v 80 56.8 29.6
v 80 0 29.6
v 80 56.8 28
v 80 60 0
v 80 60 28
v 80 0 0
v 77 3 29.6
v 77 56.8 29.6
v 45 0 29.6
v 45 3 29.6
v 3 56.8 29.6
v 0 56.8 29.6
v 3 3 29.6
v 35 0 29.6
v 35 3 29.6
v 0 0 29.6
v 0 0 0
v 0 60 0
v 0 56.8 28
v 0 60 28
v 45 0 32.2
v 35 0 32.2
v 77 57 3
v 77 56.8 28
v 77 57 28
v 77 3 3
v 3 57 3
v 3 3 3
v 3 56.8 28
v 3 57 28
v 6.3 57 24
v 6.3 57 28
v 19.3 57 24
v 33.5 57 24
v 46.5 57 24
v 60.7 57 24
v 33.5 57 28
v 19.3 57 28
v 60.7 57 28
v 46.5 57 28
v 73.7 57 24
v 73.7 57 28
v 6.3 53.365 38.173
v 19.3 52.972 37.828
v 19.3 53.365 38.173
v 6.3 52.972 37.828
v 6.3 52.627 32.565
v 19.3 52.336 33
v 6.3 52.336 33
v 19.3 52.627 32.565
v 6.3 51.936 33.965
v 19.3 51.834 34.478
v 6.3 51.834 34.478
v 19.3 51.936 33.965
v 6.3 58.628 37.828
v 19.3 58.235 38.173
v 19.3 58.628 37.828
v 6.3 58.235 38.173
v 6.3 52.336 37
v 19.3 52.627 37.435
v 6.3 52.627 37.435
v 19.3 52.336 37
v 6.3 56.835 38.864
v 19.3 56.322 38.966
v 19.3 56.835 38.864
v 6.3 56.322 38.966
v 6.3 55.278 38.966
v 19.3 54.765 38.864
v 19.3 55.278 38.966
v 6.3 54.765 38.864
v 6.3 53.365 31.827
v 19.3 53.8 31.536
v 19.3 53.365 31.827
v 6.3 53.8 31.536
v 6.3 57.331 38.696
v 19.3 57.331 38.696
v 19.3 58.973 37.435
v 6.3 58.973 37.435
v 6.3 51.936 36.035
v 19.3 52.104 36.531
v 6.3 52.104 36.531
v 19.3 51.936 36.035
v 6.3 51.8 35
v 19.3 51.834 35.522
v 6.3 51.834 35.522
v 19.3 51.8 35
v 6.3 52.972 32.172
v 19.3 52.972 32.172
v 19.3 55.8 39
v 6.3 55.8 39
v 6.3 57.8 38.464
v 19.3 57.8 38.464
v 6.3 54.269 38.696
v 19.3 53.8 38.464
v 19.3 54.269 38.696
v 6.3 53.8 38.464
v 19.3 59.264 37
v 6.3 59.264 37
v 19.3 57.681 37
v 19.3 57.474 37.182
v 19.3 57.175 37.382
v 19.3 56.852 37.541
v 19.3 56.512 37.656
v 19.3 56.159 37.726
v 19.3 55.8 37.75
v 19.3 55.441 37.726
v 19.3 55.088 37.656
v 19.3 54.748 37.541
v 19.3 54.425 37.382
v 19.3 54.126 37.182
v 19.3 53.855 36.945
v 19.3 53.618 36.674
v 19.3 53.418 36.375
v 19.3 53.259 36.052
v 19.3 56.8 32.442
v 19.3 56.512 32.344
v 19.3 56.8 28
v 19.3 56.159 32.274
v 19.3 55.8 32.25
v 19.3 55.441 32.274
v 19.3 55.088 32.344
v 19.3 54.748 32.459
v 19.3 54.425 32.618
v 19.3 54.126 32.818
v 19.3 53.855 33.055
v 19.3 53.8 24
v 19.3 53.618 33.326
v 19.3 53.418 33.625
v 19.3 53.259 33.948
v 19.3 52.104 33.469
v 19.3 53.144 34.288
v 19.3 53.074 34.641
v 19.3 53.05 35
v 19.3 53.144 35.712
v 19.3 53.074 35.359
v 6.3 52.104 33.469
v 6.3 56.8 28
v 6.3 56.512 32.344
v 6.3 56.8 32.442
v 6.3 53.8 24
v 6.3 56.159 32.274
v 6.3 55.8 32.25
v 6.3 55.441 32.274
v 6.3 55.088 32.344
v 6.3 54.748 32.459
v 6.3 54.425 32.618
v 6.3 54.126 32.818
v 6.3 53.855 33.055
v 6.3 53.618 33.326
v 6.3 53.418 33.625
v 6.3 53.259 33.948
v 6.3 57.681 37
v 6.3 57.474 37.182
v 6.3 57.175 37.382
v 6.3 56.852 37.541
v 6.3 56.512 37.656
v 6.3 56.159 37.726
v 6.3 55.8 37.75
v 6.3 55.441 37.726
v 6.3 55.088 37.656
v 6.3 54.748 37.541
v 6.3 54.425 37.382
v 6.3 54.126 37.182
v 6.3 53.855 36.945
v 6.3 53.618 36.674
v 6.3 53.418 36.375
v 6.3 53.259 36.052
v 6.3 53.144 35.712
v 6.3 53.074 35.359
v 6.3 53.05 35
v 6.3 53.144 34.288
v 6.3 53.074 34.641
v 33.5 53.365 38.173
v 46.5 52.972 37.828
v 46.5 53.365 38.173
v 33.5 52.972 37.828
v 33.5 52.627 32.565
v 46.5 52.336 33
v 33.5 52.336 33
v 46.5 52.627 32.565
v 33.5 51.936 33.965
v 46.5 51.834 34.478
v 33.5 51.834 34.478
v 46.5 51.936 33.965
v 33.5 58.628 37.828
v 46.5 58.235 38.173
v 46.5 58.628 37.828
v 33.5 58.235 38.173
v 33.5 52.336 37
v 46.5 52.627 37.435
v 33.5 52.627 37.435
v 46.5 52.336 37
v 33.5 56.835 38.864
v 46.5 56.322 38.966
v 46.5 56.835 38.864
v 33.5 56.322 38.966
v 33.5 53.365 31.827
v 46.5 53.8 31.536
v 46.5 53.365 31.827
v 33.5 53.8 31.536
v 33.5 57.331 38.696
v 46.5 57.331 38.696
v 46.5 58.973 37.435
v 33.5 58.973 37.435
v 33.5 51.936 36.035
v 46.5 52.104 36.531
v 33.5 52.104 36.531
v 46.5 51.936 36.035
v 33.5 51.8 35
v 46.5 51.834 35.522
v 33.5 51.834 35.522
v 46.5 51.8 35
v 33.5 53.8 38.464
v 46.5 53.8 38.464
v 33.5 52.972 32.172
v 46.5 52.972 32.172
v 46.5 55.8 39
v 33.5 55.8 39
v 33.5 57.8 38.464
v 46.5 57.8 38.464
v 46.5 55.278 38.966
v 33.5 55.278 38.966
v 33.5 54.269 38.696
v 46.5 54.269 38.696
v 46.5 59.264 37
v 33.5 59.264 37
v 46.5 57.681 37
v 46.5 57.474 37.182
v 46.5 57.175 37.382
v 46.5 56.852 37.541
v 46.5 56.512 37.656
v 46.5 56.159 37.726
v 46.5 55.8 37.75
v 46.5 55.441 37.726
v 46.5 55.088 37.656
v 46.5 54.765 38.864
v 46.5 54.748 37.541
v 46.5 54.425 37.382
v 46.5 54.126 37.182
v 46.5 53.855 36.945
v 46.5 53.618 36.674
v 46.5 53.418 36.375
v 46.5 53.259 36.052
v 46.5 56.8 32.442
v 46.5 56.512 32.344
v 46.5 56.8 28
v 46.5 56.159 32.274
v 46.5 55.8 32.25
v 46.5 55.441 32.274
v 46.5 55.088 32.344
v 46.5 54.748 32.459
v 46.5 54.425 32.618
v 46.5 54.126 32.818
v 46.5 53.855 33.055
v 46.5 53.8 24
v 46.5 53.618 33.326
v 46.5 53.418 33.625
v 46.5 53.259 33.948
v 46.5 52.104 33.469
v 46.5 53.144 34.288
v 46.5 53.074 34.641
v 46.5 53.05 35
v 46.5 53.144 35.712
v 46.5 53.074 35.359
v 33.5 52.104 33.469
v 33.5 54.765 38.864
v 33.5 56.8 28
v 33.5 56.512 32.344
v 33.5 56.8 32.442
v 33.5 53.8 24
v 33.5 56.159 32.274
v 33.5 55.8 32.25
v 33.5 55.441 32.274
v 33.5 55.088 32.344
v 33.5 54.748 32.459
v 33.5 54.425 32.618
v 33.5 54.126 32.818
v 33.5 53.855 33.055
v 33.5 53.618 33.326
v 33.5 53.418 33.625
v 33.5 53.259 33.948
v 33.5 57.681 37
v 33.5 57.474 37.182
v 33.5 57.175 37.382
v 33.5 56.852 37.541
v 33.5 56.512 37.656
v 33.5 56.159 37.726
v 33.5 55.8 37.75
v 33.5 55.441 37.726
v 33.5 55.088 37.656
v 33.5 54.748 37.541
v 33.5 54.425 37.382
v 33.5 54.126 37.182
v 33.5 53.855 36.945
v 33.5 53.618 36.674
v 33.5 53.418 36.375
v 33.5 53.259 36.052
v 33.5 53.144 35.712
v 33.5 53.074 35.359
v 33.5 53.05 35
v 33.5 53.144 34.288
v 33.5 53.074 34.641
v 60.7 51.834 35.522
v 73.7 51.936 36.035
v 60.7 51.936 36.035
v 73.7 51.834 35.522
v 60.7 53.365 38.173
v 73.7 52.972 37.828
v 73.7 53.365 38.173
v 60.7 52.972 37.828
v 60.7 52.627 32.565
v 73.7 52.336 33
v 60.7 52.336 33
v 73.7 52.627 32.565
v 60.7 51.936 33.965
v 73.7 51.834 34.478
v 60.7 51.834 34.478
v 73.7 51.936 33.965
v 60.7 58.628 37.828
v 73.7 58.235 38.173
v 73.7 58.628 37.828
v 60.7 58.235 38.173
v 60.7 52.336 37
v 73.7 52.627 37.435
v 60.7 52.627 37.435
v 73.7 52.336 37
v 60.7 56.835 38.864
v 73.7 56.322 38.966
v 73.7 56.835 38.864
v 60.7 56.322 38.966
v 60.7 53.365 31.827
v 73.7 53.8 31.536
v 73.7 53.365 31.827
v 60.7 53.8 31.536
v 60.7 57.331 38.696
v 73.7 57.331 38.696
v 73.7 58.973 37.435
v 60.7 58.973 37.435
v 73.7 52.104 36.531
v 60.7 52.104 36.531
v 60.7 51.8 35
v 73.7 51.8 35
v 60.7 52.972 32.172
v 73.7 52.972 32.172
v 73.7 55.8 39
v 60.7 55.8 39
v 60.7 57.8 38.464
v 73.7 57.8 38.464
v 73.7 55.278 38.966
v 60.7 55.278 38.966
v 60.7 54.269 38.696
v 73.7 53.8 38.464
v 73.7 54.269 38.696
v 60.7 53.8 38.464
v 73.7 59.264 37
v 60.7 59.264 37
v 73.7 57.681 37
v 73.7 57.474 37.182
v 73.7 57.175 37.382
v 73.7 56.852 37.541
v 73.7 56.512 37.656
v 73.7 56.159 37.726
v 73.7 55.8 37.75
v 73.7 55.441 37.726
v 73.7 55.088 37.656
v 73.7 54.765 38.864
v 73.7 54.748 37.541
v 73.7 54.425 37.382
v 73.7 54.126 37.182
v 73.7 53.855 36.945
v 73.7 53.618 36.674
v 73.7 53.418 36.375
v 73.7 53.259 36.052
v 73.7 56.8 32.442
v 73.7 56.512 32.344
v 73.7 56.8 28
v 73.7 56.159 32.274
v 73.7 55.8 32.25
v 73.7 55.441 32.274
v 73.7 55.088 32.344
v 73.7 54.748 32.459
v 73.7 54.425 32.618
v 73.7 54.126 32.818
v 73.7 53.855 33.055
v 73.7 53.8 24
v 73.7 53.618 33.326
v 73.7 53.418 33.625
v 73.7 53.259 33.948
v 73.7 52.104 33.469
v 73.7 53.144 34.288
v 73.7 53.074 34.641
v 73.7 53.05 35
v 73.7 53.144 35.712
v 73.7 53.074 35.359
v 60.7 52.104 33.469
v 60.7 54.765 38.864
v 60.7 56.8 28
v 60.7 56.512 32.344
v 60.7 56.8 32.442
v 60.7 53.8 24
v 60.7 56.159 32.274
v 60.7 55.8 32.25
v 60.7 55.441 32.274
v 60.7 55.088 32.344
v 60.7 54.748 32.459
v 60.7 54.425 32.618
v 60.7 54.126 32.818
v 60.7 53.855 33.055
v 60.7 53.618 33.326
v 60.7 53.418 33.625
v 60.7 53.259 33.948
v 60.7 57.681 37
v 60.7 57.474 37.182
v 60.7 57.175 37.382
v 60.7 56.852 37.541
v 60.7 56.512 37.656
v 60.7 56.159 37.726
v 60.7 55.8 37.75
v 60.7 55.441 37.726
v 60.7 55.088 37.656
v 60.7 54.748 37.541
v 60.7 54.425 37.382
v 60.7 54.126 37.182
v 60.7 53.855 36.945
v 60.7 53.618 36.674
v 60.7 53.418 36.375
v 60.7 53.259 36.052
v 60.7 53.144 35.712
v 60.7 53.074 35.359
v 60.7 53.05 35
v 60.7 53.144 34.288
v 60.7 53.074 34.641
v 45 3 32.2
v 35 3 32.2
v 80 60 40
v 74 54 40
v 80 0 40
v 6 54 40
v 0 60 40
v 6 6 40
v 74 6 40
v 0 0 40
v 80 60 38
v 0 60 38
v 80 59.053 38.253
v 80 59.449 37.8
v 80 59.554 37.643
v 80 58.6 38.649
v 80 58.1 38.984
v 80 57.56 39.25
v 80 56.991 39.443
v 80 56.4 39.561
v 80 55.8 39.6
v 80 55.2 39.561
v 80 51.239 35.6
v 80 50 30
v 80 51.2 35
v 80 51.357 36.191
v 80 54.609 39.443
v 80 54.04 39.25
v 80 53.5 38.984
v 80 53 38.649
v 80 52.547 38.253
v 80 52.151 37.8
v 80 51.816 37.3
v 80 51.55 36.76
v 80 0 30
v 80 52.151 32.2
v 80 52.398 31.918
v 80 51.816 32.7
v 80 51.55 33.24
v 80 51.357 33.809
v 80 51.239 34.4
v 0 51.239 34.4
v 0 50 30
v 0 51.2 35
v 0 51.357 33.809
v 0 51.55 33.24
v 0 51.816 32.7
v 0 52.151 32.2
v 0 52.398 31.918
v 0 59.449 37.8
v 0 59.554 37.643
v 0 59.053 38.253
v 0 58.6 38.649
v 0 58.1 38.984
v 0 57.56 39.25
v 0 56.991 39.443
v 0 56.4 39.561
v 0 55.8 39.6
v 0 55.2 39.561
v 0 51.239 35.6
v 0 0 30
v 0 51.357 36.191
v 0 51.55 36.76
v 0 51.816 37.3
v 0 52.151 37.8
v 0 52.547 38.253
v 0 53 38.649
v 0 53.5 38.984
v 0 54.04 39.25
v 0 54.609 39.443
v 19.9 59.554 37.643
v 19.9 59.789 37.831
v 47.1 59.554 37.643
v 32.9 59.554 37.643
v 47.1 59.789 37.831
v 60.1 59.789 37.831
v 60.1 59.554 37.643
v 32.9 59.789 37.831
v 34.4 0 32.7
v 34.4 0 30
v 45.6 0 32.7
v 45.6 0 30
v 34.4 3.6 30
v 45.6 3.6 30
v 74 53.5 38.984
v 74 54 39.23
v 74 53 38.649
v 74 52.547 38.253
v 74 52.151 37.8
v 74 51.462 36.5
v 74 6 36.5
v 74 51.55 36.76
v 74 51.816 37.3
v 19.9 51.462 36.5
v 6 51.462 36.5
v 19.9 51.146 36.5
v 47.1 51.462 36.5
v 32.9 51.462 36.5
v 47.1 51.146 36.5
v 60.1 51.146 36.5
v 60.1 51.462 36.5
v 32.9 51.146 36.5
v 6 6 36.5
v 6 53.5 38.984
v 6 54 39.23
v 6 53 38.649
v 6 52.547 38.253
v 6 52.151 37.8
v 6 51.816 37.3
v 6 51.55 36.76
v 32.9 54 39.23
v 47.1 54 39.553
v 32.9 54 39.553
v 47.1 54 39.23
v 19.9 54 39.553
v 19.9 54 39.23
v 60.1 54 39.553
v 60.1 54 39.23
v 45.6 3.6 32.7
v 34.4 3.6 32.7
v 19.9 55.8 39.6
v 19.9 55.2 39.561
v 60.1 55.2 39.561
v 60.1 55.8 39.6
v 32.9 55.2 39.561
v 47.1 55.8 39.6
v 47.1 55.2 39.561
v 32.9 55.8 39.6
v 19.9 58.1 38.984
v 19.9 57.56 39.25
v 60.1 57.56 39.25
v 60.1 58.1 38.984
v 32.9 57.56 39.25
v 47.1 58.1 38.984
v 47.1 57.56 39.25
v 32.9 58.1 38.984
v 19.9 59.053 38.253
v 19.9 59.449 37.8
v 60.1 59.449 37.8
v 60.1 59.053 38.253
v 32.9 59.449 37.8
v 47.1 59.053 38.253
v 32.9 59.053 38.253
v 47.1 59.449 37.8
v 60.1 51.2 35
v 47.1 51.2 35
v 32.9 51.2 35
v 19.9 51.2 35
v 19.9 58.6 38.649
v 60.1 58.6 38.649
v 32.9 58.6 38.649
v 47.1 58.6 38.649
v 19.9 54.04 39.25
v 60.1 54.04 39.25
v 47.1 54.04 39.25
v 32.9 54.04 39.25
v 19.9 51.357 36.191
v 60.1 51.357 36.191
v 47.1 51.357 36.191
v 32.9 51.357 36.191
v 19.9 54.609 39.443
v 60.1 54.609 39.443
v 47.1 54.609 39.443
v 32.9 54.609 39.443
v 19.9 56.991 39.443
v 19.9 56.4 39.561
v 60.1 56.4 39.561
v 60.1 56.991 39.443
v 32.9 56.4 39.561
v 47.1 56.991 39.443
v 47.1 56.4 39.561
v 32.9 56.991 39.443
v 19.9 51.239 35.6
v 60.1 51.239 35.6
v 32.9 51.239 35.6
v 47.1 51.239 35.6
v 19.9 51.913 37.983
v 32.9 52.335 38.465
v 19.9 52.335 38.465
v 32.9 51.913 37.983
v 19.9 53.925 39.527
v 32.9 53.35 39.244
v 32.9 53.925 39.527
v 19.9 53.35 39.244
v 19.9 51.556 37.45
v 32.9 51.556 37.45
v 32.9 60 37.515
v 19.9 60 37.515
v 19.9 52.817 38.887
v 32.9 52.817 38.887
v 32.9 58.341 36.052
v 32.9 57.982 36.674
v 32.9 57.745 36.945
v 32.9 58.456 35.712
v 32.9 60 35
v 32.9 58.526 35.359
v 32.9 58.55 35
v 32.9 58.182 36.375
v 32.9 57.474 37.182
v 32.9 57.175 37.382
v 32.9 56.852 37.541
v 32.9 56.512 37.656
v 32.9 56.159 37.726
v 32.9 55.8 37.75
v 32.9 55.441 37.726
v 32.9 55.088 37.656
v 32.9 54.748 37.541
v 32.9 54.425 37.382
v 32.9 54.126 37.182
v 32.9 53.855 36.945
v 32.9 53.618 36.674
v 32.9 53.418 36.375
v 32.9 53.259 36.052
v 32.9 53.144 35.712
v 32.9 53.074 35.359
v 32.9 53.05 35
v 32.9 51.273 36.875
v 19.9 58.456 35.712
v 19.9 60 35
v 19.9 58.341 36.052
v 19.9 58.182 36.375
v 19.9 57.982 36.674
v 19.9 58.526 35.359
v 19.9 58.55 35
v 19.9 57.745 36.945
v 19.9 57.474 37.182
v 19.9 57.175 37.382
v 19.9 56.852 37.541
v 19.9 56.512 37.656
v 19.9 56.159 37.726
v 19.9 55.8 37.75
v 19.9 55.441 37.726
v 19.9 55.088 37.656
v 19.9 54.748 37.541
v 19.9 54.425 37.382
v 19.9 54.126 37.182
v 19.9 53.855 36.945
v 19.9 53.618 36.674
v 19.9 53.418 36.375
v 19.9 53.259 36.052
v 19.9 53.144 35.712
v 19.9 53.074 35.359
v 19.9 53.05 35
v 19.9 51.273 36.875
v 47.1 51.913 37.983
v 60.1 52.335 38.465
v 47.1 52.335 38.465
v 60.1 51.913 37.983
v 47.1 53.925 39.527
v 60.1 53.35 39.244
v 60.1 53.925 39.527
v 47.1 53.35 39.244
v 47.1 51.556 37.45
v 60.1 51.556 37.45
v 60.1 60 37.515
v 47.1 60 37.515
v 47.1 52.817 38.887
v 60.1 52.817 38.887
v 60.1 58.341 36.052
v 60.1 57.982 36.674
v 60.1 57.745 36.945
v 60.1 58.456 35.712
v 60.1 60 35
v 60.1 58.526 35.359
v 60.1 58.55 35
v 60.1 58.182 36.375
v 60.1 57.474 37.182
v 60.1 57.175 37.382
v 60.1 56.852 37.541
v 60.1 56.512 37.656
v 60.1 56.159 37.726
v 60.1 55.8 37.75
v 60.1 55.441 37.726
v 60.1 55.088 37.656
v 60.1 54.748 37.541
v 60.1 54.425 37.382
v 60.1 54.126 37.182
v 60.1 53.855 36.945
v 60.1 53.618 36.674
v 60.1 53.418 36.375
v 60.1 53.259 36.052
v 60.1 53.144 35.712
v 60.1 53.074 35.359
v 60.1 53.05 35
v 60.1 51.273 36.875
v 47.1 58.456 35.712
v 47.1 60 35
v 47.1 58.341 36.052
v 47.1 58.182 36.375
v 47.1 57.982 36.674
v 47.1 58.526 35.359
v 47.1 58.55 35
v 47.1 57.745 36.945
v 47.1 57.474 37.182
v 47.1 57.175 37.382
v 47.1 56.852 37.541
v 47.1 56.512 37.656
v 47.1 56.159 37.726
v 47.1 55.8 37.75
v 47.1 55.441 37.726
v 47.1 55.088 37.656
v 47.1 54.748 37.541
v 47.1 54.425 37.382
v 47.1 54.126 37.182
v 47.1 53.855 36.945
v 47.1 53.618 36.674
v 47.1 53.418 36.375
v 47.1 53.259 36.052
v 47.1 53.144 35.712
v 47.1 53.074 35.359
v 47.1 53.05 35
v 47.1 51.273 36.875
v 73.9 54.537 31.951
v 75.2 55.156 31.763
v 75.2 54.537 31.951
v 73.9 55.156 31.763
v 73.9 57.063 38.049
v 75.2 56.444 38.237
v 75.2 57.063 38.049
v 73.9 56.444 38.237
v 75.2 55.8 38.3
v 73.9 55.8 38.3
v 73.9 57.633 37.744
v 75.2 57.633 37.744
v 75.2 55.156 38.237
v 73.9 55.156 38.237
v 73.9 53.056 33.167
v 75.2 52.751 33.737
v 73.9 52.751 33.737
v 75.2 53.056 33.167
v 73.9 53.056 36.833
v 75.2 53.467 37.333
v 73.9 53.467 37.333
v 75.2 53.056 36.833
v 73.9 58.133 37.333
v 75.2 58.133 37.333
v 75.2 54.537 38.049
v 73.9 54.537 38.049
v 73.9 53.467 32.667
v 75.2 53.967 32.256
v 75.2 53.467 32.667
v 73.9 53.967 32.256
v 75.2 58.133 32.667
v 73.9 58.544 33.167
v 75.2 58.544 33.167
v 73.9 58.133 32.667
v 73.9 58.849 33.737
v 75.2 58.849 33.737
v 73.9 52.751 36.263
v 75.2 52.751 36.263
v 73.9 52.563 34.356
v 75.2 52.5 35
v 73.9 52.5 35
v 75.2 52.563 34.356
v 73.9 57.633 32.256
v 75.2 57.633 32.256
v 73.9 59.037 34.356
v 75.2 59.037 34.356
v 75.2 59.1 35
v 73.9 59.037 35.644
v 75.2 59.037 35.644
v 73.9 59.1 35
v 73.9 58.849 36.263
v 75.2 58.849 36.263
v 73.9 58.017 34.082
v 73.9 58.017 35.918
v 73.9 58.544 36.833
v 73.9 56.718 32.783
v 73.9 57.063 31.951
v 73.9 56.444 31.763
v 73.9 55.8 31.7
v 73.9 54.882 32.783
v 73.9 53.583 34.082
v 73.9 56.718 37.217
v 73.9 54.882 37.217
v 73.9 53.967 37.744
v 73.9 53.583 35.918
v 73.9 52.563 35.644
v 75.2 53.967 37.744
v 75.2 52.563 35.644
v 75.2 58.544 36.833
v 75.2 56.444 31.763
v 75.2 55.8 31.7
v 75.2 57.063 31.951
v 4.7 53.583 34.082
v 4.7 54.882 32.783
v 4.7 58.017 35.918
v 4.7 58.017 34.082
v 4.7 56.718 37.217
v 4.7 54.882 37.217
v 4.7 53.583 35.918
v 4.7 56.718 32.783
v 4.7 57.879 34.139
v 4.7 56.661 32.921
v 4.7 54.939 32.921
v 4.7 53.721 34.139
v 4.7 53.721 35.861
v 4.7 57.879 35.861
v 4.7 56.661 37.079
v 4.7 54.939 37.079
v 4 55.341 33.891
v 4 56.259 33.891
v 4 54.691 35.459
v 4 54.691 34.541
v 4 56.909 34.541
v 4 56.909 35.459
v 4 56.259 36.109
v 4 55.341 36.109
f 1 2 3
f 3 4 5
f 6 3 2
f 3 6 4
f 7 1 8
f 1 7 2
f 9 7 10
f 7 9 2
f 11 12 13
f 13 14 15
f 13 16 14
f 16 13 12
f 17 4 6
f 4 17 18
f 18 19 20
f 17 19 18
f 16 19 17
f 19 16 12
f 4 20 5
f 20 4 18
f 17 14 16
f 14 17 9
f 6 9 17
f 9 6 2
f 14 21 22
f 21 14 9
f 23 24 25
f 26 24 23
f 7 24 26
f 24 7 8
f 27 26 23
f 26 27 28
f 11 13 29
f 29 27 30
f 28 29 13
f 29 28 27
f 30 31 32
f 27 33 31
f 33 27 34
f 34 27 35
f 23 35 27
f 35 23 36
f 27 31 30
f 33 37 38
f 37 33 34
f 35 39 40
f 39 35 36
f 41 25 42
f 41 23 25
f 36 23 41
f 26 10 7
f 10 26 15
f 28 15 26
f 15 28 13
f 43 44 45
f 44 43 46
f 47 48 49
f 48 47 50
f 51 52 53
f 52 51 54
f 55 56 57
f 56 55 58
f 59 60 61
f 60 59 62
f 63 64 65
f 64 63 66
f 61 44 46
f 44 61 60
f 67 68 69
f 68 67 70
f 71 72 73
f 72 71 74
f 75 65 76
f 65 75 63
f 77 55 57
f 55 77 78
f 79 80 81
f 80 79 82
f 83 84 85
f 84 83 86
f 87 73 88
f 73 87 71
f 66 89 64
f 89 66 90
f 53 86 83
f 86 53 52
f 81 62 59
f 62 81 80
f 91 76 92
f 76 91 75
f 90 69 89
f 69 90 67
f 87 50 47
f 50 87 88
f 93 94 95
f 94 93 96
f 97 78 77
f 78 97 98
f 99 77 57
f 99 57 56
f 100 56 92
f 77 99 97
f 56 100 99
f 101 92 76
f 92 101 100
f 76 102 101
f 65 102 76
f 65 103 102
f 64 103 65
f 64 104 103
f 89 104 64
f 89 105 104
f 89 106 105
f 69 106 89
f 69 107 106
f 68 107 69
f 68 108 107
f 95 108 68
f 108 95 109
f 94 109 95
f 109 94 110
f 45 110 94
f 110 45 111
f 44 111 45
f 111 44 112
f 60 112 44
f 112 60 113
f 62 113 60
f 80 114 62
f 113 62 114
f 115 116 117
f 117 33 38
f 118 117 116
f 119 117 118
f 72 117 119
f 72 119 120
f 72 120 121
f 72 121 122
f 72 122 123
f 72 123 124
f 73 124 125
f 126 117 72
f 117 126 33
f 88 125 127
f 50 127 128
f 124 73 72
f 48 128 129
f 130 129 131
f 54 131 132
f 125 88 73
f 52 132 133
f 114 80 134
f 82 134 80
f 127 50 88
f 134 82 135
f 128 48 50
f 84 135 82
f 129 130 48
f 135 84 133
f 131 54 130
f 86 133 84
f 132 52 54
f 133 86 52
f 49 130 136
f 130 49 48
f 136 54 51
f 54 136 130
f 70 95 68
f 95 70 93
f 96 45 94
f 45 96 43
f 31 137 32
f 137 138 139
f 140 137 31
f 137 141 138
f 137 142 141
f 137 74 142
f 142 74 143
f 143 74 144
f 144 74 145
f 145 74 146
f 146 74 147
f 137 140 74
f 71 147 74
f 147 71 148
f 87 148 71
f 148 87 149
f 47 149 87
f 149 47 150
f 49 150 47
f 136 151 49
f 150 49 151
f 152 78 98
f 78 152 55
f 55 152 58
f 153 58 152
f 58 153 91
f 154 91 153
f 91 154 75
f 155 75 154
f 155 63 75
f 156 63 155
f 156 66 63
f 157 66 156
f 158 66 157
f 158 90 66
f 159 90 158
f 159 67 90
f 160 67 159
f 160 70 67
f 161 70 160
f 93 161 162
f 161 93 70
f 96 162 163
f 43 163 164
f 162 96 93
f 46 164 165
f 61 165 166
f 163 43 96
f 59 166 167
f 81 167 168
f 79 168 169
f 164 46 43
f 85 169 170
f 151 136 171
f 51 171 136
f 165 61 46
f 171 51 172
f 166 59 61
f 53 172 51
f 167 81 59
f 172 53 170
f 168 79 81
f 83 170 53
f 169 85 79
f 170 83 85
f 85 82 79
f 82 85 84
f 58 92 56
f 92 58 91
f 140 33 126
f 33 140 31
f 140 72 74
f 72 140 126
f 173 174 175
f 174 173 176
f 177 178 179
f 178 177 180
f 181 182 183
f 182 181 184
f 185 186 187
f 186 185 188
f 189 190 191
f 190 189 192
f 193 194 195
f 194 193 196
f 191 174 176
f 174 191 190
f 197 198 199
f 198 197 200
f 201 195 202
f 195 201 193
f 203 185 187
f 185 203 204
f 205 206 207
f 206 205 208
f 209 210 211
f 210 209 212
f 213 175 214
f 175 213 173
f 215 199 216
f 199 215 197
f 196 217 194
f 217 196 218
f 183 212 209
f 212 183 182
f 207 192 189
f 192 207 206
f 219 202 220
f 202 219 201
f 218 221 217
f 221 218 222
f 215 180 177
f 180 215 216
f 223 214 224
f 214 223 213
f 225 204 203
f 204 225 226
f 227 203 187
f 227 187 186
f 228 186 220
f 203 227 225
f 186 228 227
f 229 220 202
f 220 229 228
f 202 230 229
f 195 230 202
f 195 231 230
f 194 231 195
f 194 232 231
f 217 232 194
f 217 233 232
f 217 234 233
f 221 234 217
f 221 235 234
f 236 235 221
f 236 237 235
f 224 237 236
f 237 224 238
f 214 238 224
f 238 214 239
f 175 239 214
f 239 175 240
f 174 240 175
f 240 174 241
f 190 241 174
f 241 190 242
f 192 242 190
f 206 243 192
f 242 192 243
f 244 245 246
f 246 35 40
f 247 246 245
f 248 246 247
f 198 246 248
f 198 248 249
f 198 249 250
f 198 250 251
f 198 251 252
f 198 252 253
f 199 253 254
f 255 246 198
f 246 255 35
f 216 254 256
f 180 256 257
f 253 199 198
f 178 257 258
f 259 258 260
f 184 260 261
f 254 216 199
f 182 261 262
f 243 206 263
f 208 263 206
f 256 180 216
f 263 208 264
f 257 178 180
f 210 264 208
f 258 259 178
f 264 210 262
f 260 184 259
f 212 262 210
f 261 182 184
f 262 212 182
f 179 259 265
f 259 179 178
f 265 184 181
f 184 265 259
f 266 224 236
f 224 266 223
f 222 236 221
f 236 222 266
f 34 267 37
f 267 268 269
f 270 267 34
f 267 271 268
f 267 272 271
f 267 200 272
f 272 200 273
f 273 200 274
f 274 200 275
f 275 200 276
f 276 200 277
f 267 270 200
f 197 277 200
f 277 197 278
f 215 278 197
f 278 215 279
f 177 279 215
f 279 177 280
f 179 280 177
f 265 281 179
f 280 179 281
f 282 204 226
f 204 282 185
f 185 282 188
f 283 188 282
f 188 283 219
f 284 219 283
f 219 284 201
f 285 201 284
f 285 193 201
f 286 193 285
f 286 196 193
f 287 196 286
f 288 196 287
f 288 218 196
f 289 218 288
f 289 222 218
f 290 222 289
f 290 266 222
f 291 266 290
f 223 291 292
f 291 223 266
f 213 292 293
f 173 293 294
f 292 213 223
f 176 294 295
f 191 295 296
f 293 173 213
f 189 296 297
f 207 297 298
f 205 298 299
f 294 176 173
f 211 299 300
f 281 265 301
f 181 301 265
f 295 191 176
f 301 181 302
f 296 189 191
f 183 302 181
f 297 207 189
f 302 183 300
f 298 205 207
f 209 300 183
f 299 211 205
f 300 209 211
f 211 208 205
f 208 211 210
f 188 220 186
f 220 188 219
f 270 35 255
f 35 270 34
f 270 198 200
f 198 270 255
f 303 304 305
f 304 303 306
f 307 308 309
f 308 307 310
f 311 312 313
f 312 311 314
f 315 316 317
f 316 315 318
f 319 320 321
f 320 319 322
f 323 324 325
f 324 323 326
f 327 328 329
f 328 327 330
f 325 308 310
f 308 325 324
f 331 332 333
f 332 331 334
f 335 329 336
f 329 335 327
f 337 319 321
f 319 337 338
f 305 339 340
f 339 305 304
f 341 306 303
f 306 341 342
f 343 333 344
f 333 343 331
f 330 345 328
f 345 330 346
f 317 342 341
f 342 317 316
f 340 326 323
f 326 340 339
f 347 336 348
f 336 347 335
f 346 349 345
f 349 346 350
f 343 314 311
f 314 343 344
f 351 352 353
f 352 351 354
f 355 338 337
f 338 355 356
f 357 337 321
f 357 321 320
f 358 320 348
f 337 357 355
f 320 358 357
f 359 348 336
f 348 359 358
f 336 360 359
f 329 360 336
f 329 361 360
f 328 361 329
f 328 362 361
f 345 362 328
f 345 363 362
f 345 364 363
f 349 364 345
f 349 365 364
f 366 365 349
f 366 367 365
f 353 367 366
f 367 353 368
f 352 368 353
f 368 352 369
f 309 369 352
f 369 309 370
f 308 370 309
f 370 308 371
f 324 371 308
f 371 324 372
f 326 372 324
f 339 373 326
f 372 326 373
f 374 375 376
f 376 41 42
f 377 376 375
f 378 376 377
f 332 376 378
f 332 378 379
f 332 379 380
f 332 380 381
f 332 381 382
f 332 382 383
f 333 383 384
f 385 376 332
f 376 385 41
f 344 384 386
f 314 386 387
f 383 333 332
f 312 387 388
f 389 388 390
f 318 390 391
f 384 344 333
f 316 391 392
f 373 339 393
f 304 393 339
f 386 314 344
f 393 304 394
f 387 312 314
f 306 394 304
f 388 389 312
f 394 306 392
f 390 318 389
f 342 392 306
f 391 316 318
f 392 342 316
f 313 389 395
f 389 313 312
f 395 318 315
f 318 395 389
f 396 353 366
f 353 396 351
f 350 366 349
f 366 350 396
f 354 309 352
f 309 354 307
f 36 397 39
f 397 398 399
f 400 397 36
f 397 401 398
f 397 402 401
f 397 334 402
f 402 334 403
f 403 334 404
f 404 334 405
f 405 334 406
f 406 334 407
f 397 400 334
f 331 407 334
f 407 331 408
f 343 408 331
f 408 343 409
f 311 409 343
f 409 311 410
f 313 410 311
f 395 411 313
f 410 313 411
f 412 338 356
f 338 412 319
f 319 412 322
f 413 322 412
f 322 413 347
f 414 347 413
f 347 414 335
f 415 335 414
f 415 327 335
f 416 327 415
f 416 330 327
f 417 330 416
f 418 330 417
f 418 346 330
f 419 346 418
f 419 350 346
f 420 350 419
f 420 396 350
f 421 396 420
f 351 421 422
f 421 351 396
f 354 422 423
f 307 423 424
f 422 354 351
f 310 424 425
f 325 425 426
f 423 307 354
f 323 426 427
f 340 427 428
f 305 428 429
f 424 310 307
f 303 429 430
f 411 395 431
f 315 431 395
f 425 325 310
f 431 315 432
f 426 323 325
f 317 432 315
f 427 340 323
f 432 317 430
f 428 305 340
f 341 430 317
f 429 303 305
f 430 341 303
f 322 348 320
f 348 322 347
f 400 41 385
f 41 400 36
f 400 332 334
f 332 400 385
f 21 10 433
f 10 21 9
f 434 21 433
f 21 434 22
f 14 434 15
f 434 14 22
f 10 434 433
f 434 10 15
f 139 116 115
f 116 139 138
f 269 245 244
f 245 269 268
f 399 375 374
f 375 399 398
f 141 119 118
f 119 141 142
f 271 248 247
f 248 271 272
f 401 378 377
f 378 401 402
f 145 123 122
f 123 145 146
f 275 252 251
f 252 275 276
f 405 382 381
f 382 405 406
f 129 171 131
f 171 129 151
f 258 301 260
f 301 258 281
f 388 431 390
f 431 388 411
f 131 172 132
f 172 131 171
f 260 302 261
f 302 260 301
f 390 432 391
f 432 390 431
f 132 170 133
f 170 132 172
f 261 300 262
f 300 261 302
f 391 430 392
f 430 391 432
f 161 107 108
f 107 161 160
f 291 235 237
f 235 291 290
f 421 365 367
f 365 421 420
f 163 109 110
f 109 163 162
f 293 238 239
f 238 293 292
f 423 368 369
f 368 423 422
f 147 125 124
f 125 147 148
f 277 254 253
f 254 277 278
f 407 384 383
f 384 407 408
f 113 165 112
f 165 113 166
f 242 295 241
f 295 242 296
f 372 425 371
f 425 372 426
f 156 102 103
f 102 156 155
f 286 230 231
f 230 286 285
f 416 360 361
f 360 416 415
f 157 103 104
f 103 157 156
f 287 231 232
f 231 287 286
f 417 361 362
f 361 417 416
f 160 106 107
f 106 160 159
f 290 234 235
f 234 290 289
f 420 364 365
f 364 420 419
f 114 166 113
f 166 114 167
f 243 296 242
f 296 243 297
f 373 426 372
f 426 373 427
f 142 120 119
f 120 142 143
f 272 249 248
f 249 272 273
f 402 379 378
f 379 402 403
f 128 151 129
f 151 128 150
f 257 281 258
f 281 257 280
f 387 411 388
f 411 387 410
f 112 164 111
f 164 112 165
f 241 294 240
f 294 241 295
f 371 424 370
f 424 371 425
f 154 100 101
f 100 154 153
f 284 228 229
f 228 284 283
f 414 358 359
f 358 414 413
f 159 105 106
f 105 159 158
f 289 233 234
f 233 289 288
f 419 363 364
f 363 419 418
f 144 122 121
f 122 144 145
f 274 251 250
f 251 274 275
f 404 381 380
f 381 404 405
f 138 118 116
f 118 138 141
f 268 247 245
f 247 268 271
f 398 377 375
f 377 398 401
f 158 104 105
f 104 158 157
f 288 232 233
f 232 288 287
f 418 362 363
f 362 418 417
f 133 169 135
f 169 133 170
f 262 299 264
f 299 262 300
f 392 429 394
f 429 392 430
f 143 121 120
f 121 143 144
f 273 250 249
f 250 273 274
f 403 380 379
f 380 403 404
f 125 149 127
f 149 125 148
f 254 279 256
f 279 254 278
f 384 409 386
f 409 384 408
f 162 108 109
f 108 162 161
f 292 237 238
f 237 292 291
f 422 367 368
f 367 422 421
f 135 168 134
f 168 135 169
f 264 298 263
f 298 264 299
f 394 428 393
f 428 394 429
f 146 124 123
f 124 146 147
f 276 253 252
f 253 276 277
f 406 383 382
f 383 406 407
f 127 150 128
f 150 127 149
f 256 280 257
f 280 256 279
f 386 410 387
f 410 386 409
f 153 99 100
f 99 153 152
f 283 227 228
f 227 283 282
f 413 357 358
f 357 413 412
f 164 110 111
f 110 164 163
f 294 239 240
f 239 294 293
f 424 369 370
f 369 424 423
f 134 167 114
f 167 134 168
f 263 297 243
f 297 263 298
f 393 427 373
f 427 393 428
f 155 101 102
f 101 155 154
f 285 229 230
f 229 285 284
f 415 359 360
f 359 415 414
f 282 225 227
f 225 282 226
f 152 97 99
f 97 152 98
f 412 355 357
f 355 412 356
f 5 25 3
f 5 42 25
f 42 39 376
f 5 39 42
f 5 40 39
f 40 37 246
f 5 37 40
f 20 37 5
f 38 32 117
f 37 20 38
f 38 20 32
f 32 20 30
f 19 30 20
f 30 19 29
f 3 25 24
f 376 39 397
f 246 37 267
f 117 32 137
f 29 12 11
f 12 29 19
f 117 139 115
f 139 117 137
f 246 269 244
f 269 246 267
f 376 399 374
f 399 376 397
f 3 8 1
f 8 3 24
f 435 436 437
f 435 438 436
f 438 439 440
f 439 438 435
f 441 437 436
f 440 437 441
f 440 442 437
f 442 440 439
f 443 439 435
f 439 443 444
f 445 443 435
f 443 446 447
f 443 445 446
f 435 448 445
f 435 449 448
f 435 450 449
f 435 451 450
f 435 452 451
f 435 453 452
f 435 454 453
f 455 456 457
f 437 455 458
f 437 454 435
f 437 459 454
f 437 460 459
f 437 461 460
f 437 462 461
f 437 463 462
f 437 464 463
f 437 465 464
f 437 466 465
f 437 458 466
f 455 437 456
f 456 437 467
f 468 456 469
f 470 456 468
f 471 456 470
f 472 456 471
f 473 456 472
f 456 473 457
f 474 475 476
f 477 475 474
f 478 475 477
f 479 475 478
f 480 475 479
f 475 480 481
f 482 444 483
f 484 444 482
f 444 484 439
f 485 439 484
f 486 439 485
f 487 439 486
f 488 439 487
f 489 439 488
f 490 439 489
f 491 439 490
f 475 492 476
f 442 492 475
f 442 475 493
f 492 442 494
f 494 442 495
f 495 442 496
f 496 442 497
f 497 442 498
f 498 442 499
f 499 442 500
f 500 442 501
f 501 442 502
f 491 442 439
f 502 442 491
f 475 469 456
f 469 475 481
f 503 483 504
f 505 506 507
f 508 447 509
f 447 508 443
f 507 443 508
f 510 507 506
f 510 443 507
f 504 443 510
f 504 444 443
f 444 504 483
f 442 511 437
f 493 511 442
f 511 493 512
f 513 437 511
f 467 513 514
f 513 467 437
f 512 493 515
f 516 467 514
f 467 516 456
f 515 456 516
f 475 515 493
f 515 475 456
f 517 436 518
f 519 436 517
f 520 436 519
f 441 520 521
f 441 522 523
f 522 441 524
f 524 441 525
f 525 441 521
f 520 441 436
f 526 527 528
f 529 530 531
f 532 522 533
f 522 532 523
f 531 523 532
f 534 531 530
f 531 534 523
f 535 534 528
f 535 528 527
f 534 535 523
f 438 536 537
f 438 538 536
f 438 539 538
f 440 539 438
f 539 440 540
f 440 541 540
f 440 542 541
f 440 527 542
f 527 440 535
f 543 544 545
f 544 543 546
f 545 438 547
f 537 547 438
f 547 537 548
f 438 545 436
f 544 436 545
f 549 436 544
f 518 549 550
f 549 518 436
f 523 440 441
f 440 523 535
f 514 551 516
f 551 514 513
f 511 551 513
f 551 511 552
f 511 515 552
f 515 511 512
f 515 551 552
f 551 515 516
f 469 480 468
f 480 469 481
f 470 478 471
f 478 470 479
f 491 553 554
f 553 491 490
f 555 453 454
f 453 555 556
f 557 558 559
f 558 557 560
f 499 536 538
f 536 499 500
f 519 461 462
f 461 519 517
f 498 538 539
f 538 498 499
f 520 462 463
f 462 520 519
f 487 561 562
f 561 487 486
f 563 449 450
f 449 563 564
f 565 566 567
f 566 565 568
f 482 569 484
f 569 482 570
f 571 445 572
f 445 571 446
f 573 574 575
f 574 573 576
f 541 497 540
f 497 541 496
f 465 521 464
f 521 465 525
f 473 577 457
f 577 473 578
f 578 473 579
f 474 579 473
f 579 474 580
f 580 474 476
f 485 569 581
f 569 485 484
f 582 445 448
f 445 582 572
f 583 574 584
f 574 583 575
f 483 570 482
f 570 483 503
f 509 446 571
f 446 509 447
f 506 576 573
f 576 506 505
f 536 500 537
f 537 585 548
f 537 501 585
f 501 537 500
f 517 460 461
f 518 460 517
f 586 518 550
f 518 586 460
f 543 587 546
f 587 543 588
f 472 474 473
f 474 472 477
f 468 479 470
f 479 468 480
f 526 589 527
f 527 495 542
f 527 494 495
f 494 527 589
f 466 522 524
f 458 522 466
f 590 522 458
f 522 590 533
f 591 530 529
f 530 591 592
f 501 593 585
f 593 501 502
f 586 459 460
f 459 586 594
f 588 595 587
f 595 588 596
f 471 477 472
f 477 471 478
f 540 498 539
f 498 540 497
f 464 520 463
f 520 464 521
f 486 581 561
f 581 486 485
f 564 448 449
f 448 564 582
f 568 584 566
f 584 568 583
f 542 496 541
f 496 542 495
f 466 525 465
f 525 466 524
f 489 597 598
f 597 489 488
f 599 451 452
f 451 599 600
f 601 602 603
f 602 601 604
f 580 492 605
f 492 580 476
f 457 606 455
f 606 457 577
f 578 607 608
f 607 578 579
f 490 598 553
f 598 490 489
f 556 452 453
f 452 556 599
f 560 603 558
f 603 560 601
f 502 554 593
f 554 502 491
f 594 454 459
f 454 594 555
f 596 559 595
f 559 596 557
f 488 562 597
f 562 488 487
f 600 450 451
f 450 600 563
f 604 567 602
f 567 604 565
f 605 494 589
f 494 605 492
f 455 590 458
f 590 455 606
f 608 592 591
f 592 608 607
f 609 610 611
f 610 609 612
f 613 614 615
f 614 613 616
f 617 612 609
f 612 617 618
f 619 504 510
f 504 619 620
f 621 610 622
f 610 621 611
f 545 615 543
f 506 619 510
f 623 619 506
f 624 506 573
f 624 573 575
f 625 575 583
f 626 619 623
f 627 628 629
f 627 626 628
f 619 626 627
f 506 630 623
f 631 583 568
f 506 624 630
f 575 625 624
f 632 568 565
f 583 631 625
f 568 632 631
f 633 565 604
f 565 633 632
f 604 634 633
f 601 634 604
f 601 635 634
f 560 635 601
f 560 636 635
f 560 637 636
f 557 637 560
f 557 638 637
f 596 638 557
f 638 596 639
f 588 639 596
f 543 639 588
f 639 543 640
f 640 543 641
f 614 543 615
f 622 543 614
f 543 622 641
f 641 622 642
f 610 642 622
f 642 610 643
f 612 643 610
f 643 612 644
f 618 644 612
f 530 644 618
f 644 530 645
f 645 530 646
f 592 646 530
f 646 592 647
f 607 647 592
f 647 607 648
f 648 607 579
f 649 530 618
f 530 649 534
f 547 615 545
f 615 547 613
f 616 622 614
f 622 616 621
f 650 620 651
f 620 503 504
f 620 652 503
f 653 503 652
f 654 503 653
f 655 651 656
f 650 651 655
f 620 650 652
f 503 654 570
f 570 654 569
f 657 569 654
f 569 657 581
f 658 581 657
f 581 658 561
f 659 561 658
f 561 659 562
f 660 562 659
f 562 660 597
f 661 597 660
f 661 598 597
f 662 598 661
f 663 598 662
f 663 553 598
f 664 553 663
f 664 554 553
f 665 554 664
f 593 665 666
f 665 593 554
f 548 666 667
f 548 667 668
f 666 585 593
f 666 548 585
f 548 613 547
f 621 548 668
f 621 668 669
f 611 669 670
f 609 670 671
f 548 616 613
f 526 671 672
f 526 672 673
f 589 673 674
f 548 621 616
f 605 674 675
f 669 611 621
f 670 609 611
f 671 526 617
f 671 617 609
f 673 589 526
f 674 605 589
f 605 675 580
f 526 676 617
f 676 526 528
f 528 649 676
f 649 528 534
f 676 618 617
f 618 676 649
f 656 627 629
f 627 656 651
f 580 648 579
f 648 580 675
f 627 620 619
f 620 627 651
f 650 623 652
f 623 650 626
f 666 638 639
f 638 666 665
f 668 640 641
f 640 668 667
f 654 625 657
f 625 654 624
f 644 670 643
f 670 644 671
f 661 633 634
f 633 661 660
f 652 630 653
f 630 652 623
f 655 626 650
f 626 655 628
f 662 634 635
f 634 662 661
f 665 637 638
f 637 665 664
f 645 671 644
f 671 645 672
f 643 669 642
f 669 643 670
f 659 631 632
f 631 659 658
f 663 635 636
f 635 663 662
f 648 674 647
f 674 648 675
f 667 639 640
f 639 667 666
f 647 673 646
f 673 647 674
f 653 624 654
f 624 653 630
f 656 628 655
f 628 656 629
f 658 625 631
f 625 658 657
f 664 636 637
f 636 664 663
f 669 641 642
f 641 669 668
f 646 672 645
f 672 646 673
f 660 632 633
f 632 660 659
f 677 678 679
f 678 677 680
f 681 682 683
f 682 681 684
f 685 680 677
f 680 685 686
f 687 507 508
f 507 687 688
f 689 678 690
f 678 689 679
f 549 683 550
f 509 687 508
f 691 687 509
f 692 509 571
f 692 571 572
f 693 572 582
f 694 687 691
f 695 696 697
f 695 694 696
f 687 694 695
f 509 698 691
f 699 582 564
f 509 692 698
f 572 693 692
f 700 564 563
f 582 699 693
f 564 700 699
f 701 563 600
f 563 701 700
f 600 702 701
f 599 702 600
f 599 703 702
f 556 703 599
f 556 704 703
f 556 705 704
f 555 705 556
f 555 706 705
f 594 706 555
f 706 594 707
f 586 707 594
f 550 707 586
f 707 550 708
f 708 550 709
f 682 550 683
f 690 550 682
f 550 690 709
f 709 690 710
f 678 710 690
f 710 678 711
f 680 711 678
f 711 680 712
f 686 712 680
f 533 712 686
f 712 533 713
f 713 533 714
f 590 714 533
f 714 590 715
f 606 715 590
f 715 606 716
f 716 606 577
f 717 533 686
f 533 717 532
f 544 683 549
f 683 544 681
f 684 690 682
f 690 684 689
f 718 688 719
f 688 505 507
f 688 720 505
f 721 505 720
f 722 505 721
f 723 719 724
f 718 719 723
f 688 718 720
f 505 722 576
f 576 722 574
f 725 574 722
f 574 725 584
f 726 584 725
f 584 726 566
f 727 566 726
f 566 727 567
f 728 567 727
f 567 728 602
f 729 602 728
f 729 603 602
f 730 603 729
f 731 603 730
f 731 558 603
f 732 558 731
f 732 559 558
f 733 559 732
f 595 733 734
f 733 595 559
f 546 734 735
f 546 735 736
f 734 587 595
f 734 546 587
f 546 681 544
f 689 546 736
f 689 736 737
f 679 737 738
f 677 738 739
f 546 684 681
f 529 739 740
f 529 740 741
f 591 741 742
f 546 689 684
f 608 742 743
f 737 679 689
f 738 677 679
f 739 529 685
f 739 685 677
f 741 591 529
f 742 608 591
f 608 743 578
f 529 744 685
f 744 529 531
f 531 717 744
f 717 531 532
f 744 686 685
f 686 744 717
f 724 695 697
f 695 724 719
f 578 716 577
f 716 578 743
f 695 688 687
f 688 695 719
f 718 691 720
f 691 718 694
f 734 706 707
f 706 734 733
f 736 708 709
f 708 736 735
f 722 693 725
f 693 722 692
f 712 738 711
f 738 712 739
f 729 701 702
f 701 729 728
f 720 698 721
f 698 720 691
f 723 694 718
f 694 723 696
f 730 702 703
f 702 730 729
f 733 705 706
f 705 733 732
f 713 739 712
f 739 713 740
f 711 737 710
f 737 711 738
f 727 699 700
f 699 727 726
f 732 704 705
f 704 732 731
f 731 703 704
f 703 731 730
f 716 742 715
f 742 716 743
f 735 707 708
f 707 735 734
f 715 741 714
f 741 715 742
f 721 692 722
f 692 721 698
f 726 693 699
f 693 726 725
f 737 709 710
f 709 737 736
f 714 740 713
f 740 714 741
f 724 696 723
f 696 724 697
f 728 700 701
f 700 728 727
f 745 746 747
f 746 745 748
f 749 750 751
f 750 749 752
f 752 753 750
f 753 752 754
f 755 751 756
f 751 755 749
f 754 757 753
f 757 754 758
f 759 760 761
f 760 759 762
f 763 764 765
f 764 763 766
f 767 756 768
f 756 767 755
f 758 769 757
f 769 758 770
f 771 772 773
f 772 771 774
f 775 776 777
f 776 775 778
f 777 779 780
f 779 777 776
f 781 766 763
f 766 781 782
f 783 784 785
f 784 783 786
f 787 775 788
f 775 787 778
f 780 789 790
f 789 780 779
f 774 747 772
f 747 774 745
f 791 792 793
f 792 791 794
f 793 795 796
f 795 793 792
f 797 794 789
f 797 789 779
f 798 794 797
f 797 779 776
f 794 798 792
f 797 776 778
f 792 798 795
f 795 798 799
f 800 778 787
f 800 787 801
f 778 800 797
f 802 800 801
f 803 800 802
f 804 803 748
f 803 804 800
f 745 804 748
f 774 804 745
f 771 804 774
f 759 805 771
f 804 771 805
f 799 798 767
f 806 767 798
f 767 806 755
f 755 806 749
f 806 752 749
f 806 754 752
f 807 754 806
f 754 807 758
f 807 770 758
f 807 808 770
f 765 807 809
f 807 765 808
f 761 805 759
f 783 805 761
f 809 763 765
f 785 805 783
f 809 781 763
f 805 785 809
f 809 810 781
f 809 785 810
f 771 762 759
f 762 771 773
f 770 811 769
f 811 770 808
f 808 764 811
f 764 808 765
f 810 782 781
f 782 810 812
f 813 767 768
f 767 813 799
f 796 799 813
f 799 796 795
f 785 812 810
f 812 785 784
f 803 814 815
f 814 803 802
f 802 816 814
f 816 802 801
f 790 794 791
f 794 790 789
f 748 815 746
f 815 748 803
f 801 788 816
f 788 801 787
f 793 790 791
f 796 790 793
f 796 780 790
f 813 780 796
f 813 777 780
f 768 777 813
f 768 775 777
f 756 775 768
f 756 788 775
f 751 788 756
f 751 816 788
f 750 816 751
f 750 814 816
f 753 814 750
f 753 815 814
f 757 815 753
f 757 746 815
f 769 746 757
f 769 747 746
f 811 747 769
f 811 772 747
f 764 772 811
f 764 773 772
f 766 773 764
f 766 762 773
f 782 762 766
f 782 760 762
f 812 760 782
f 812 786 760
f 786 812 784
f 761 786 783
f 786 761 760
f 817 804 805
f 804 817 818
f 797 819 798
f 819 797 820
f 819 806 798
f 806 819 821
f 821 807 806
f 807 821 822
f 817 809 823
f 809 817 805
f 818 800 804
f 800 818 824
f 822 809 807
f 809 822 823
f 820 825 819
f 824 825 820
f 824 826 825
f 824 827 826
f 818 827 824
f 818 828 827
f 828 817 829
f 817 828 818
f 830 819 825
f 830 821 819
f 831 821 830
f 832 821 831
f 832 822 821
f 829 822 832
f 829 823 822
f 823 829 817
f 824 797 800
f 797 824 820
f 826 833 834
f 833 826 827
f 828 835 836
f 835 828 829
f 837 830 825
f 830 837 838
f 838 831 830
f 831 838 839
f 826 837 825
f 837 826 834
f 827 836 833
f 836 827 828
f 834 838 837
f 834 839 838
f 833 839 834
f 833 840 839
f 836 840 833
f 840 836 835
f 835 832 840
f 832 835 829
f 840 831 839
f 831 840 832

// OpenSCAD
// Print-in-place hinged box, 80 x 60 x 40 mm closed.
// Printed closed in PLA (Bambu A1, 0.4 nozzle): base, lid and a captive
// hinge pin are separate bodies with 0.35-0.6 mm clearances, so the hinge
// breaks free by hand.  No supports: the lid underside bridges the cavity,
// the hinge barrels/pin use faceted (octagonal) lower surfaces, and all
// other downward faces are short bridges or rest on the body below.

/* [Part] */
part = "assembly"; // [assembly, box, lid, pin]

/* [Dimensions] */
box_w = 80;          // X, outside
box_d = 60;          // Y, outside (front y=0, back y=60)
box_h = 29.6;        // base height to its rim
lid_h = 10;          // lid height; lid bottom at z=30 (0.4 gap)
lid_z = 30;
wall = 3;
floor_t = 3;
total_h = 40;

hinge_y = 55.8;      // hinge axis, assembly coords
hinge_z = 35;
barrel_r = 4.0;
pin_r = 2.4;         // octagon circumradius
bore_r = 2.75;       // pin_r + 0.35 radial clearance
relief_r = 4.6;      // barrel_r + 0.6

// Alternating knuckles along the back edge (x intervals), 0.6 mm end gaps.
box_segs  = [[6.3, 19.3], [33.5, 46.5], [60.7, 73.7]];
lid_segs  = [[19.9, 32.9], [47.1, 60.1]];

cadverify_only = "";
module instance(name, part_name, unit = 1) {
    echo(cadverify_instance = [name, part_name, unit]);
    if (cadverify_only == "" || cadverify_only == name) children();
}

// ---------------------------------------------------------------- base (box)
module box_main() {
    difference() {
        union() {
            // shell: outer block minus open-top cavity
            difference() {
                cube([box_w, box_d, box_h]);
                translate([wall, wall, floor_t]) cube([box_w - 2 * wall, box_d - 2 * wall, box_h]);
            }
            // hinge knuckles (base) + support posts down to the back wall
            for (s = box_segs) {
                translate([s[0], hinge_y, hinge_z]) rotate([0, 90, 0])
                    cylinder(h = s[1] - s[0], r = barrel_r, $fn = 48);
                translate([s[0], 53.8, 24]) cube([s[1] - s[0], 6.2, 11.5]);
            }
            // front catch tooth (enters the socket in the lid)
            translate([35, 0, box_h]) cube([10, wall, 2.6]);
        }
        // pin bore through the base knuckles
        translate([-1, hinge_y, hinge_z]) rotate([0, 90, 0])
            cylinder(h = box_w + 2, r = bore_r, $fn = 48);
        // swing clearance notch: rear strip of wall/posts above z=28,
        // behind y=56.8, so the lid's rear lip clears it past 90 deg
        translate([-1, 56.8, 28]) cube([box_w + 2, 5, 9]);
    }
}

// ---------------------------------------------------------------- lid (local: z 0..10, hinge axis at z=5)
module lid_main() {
    union() {
        difference() {
            union() {
                // main slab, side profile (Y-Z) extruded along X.
                // Rear lower edge chamfered 50,0 -> 60,8 so the slab
                // swings clear of the base back wall.
                rotate([0, 90, 0])
                    linear_extrude(height = box_w)
                        polygon(points = [[0, 0], [0, 50], [-8, 60], [-10, 60], [-10, 0]]);
                // hinge knuckles (lid)
                for (s = lid_segs)
                    translate([s[0], hinge_y, 5]) rotate([0, 90, 0])
                        cylinder(h = s[1] - s[0], r = barrel_r, $fn = 48);
            }
            // recessed panel in the top face
            translate([6, 6, 6.5]) cube([68, 48, 4]);
            // front catch socket (tooth: x35..45, z assy 29.6..32.2)
            translate([34.4, -1, -0.5]) cube([11.2, 4.6, 3.2]);
            // clearance tunnel for the base knuckles / pin
            translate([-1, hinge_y, 5]) rotate([0, 90, 0])
                cylinder(h = box_w + 2, r = relief_r, $fn = 48);
            // pin bore through the lid knuckles
            translate([-1, hinge_y, 5]) rotate([0, 90, 0])
                cylinder(h = box_w + 2, r = bore_r, $fn = 48);
        }
        // webs joining lid knuckles to the slab: upper half-discs r=4.9
        // (stay above z=30.1 in assembly, clear of the base rim at 29.6)
        for (s = lid_segs)
            difference() {
                intersection() {
                    translate([s[0], hinge_y, 5]) rotate([0, 90, 0])
                        cylinder(h = s[1] - s[0], r = 4.9, $fn = 48);
                    translate([s[0], hinge_y - 10, 5]) cube([s[1] - s[0], 20, 5]);
                    translate([s[0], 0, 0]) cube([s[1] - s[0], box_d, lid_h]);
                }
                translate([s[0] - 1, hinge_y, 5]) rotate([0, 90, 0])
                    cylinder(h = s[1] - s[0] + 2, r = bore_r, $fn = 48);
            }
    }
}

// ---------------------------------------------------------------- pin
// Centred on its axis, local +Z from head (z=0) to tip (z=71.2).
module pin_geom() {
    union() {
        cylinder(h = 1.3, r = 3.3, $fn = 32);                    // head
        translate([0, 0, 1.0]) rotate([0, 0, 22.5])
            cylinder(h = 69.5, r = pin_r, $fn = 8);              // octagonal shaft
        translate([0, 0, 70.4]) rotate([0, 0, 22.5])
            cylinder(h = 0.8, r1 = pin_r, r2 = 1.2, $fn = 8);    // lead-in tip
    }
}
module pin_part() { translate([3.3, 3.3, 0]) pin_geom(); }

// ---------------------------------------------------------------- output
if (part == "box") {
    echo(cadverify_spec = [
        ["bounds", [[0, 0, 0], [box_w, box_d, hinge_z + barrel_r]]],
        ["bodies", 1],
        ["copies", 1],
        ["support_faces", [["bed", "-z", 4000]]],
        ["overhangs_allowed", [["hinge knuckles and pin bore print in place; faceted bore ceiling is a short internal bridge", [[5, 51, 30], [75, 60, 39.5]]], ["knuckle support ledge underside, 3.2 mm protrusion bridging to the back wall", [[5, 53, 23], [75, 58, 25]]]]],
        ["details", [
            ["cavity", "void", [[4, 4, 10], [76, 53, 29]], 0.95],
            ["front_wall", "thickness", [40, -1, 15], [0, 1, 0], 3],
            ["floor", "thickness", [40, 30, -1], [0, 0, 1], 3],
            ["box_knuckle", "material", [[7, 52, 33.5], [18, 53.8, 36.5]], 0.6],
            ["pin_bore", "void", [[8, 54.9, 34.1], [17, 56.7, 35.9]], 0.9],
            ["catch_tooth", "material", [[36, 0.5, 30], [44, 2.5, 32]], 0.85],
            ["hinge_knuckles", "view", [[4, 50, 28], [76, 60, 39.5]]]
        ]]
    ]);
    box_main();
} else if (part == "lid") {
    echo(cadverify_spec = [
        ["bounds", [[0, 0, 0], [box_w, box_d, lid_h]]],
        ["bodies", 1],
        ["copies", 1],
        ["support_faces", [["print_face", "-z", 3000]]],
        ["overhangs_allowed", [["lid hinge relief, knuckle bores and rear swing chamfer print in place around pin and box knuckles; ceilings are short internal bridges and the chamfer is 51 deg", [[0, 49, 0], [80, 60, 10]]], ["catch socket ceiling, 11 mm bridge across the socket", [[33, 0, 2], [47, 4, 3.5]]]]],
        ["details", [
            ["top_pocket", "void", [[7, 7, 6.6], [73, 53, 9.9]], 0.95],
            ["lid_slab", "thickness", [40, 30, 9], [0, 0, -1], 6.5],
            ["lid_knuckle", "material", [[21, 52, 3.5], [32, 53.8, 6.5]], 0.45],
            ["pin_bore", "void", [[22, 55.4, 4.6], [31, 56.2, 5.4]], 0.45],
            ["catch_socket", "void", [[35, 0.5, 0.2], [45, 2.5, 2.5]], 0.9],
            ["hinge_knuckles", "view", [[4, 50, 0], [76, 60, 10]]]
        ]]
    ]);
    lid_main();
} else if (part == "pin") {
    echo(cadverify_spec = [
        ["bounds", [[0, 0, 0], [6.6, 6.6, 71.2]]],
        ["bodies", 1],
        ["copies", 1],
        ["support_faces", [["head_base", "-z", 30]]],
        ["overhangs_allowed", []],
        ["details", [
            ["pin_shaft", "material", [[2, 2, 10], [4.6, 4.6, 20]], 0.9],
            ["pin_head", "material", [[1, 1, 0.1], [5.6, 5.6, 1.2]], 0.75],
            ["pin_length", "thickness", [1.2, 3.3, 72], [0, 0, -1], 71.2],
            ["pin_head_view", "view", [[0, 0, 0], [6.6, 6.6, 2]]]
        ]]
    ]);
    pin_part();
} else if (part == "assembly") {
    echo(cadverify_spec = [
        ["bounds", [[0, 0, 0], [box_w, box_d, total_h]]],
        ["support_faces", [["bed", "-z", 4000]]],
        ["allowed_interferences", []],
        ["motions", [
            ["lid_swing", ["lid"], "rotate", [0, hinge_y, hinge_z], [-1, 0, 0], [0, 110]]
        ]],
        ["assembly_order", [
            [["base"], [0, 0, 0]],
            [["pin"], [-1, 0, 0]],
            [["lid"], [0, 0, -1], ["rotate", [0, hinge_y, hinge_z], [-1, 0, 0], 110]]
        ]]
    ]);
    instance("base", "box") box_main();
    instance("lid", "lid") translate([0, 0, lid_z]) lid_main();
    instance("pin", "pin") translate([75.2, hinge_y, hinge_z]) rotate([0, -90, 0]) pin_geom();
}
